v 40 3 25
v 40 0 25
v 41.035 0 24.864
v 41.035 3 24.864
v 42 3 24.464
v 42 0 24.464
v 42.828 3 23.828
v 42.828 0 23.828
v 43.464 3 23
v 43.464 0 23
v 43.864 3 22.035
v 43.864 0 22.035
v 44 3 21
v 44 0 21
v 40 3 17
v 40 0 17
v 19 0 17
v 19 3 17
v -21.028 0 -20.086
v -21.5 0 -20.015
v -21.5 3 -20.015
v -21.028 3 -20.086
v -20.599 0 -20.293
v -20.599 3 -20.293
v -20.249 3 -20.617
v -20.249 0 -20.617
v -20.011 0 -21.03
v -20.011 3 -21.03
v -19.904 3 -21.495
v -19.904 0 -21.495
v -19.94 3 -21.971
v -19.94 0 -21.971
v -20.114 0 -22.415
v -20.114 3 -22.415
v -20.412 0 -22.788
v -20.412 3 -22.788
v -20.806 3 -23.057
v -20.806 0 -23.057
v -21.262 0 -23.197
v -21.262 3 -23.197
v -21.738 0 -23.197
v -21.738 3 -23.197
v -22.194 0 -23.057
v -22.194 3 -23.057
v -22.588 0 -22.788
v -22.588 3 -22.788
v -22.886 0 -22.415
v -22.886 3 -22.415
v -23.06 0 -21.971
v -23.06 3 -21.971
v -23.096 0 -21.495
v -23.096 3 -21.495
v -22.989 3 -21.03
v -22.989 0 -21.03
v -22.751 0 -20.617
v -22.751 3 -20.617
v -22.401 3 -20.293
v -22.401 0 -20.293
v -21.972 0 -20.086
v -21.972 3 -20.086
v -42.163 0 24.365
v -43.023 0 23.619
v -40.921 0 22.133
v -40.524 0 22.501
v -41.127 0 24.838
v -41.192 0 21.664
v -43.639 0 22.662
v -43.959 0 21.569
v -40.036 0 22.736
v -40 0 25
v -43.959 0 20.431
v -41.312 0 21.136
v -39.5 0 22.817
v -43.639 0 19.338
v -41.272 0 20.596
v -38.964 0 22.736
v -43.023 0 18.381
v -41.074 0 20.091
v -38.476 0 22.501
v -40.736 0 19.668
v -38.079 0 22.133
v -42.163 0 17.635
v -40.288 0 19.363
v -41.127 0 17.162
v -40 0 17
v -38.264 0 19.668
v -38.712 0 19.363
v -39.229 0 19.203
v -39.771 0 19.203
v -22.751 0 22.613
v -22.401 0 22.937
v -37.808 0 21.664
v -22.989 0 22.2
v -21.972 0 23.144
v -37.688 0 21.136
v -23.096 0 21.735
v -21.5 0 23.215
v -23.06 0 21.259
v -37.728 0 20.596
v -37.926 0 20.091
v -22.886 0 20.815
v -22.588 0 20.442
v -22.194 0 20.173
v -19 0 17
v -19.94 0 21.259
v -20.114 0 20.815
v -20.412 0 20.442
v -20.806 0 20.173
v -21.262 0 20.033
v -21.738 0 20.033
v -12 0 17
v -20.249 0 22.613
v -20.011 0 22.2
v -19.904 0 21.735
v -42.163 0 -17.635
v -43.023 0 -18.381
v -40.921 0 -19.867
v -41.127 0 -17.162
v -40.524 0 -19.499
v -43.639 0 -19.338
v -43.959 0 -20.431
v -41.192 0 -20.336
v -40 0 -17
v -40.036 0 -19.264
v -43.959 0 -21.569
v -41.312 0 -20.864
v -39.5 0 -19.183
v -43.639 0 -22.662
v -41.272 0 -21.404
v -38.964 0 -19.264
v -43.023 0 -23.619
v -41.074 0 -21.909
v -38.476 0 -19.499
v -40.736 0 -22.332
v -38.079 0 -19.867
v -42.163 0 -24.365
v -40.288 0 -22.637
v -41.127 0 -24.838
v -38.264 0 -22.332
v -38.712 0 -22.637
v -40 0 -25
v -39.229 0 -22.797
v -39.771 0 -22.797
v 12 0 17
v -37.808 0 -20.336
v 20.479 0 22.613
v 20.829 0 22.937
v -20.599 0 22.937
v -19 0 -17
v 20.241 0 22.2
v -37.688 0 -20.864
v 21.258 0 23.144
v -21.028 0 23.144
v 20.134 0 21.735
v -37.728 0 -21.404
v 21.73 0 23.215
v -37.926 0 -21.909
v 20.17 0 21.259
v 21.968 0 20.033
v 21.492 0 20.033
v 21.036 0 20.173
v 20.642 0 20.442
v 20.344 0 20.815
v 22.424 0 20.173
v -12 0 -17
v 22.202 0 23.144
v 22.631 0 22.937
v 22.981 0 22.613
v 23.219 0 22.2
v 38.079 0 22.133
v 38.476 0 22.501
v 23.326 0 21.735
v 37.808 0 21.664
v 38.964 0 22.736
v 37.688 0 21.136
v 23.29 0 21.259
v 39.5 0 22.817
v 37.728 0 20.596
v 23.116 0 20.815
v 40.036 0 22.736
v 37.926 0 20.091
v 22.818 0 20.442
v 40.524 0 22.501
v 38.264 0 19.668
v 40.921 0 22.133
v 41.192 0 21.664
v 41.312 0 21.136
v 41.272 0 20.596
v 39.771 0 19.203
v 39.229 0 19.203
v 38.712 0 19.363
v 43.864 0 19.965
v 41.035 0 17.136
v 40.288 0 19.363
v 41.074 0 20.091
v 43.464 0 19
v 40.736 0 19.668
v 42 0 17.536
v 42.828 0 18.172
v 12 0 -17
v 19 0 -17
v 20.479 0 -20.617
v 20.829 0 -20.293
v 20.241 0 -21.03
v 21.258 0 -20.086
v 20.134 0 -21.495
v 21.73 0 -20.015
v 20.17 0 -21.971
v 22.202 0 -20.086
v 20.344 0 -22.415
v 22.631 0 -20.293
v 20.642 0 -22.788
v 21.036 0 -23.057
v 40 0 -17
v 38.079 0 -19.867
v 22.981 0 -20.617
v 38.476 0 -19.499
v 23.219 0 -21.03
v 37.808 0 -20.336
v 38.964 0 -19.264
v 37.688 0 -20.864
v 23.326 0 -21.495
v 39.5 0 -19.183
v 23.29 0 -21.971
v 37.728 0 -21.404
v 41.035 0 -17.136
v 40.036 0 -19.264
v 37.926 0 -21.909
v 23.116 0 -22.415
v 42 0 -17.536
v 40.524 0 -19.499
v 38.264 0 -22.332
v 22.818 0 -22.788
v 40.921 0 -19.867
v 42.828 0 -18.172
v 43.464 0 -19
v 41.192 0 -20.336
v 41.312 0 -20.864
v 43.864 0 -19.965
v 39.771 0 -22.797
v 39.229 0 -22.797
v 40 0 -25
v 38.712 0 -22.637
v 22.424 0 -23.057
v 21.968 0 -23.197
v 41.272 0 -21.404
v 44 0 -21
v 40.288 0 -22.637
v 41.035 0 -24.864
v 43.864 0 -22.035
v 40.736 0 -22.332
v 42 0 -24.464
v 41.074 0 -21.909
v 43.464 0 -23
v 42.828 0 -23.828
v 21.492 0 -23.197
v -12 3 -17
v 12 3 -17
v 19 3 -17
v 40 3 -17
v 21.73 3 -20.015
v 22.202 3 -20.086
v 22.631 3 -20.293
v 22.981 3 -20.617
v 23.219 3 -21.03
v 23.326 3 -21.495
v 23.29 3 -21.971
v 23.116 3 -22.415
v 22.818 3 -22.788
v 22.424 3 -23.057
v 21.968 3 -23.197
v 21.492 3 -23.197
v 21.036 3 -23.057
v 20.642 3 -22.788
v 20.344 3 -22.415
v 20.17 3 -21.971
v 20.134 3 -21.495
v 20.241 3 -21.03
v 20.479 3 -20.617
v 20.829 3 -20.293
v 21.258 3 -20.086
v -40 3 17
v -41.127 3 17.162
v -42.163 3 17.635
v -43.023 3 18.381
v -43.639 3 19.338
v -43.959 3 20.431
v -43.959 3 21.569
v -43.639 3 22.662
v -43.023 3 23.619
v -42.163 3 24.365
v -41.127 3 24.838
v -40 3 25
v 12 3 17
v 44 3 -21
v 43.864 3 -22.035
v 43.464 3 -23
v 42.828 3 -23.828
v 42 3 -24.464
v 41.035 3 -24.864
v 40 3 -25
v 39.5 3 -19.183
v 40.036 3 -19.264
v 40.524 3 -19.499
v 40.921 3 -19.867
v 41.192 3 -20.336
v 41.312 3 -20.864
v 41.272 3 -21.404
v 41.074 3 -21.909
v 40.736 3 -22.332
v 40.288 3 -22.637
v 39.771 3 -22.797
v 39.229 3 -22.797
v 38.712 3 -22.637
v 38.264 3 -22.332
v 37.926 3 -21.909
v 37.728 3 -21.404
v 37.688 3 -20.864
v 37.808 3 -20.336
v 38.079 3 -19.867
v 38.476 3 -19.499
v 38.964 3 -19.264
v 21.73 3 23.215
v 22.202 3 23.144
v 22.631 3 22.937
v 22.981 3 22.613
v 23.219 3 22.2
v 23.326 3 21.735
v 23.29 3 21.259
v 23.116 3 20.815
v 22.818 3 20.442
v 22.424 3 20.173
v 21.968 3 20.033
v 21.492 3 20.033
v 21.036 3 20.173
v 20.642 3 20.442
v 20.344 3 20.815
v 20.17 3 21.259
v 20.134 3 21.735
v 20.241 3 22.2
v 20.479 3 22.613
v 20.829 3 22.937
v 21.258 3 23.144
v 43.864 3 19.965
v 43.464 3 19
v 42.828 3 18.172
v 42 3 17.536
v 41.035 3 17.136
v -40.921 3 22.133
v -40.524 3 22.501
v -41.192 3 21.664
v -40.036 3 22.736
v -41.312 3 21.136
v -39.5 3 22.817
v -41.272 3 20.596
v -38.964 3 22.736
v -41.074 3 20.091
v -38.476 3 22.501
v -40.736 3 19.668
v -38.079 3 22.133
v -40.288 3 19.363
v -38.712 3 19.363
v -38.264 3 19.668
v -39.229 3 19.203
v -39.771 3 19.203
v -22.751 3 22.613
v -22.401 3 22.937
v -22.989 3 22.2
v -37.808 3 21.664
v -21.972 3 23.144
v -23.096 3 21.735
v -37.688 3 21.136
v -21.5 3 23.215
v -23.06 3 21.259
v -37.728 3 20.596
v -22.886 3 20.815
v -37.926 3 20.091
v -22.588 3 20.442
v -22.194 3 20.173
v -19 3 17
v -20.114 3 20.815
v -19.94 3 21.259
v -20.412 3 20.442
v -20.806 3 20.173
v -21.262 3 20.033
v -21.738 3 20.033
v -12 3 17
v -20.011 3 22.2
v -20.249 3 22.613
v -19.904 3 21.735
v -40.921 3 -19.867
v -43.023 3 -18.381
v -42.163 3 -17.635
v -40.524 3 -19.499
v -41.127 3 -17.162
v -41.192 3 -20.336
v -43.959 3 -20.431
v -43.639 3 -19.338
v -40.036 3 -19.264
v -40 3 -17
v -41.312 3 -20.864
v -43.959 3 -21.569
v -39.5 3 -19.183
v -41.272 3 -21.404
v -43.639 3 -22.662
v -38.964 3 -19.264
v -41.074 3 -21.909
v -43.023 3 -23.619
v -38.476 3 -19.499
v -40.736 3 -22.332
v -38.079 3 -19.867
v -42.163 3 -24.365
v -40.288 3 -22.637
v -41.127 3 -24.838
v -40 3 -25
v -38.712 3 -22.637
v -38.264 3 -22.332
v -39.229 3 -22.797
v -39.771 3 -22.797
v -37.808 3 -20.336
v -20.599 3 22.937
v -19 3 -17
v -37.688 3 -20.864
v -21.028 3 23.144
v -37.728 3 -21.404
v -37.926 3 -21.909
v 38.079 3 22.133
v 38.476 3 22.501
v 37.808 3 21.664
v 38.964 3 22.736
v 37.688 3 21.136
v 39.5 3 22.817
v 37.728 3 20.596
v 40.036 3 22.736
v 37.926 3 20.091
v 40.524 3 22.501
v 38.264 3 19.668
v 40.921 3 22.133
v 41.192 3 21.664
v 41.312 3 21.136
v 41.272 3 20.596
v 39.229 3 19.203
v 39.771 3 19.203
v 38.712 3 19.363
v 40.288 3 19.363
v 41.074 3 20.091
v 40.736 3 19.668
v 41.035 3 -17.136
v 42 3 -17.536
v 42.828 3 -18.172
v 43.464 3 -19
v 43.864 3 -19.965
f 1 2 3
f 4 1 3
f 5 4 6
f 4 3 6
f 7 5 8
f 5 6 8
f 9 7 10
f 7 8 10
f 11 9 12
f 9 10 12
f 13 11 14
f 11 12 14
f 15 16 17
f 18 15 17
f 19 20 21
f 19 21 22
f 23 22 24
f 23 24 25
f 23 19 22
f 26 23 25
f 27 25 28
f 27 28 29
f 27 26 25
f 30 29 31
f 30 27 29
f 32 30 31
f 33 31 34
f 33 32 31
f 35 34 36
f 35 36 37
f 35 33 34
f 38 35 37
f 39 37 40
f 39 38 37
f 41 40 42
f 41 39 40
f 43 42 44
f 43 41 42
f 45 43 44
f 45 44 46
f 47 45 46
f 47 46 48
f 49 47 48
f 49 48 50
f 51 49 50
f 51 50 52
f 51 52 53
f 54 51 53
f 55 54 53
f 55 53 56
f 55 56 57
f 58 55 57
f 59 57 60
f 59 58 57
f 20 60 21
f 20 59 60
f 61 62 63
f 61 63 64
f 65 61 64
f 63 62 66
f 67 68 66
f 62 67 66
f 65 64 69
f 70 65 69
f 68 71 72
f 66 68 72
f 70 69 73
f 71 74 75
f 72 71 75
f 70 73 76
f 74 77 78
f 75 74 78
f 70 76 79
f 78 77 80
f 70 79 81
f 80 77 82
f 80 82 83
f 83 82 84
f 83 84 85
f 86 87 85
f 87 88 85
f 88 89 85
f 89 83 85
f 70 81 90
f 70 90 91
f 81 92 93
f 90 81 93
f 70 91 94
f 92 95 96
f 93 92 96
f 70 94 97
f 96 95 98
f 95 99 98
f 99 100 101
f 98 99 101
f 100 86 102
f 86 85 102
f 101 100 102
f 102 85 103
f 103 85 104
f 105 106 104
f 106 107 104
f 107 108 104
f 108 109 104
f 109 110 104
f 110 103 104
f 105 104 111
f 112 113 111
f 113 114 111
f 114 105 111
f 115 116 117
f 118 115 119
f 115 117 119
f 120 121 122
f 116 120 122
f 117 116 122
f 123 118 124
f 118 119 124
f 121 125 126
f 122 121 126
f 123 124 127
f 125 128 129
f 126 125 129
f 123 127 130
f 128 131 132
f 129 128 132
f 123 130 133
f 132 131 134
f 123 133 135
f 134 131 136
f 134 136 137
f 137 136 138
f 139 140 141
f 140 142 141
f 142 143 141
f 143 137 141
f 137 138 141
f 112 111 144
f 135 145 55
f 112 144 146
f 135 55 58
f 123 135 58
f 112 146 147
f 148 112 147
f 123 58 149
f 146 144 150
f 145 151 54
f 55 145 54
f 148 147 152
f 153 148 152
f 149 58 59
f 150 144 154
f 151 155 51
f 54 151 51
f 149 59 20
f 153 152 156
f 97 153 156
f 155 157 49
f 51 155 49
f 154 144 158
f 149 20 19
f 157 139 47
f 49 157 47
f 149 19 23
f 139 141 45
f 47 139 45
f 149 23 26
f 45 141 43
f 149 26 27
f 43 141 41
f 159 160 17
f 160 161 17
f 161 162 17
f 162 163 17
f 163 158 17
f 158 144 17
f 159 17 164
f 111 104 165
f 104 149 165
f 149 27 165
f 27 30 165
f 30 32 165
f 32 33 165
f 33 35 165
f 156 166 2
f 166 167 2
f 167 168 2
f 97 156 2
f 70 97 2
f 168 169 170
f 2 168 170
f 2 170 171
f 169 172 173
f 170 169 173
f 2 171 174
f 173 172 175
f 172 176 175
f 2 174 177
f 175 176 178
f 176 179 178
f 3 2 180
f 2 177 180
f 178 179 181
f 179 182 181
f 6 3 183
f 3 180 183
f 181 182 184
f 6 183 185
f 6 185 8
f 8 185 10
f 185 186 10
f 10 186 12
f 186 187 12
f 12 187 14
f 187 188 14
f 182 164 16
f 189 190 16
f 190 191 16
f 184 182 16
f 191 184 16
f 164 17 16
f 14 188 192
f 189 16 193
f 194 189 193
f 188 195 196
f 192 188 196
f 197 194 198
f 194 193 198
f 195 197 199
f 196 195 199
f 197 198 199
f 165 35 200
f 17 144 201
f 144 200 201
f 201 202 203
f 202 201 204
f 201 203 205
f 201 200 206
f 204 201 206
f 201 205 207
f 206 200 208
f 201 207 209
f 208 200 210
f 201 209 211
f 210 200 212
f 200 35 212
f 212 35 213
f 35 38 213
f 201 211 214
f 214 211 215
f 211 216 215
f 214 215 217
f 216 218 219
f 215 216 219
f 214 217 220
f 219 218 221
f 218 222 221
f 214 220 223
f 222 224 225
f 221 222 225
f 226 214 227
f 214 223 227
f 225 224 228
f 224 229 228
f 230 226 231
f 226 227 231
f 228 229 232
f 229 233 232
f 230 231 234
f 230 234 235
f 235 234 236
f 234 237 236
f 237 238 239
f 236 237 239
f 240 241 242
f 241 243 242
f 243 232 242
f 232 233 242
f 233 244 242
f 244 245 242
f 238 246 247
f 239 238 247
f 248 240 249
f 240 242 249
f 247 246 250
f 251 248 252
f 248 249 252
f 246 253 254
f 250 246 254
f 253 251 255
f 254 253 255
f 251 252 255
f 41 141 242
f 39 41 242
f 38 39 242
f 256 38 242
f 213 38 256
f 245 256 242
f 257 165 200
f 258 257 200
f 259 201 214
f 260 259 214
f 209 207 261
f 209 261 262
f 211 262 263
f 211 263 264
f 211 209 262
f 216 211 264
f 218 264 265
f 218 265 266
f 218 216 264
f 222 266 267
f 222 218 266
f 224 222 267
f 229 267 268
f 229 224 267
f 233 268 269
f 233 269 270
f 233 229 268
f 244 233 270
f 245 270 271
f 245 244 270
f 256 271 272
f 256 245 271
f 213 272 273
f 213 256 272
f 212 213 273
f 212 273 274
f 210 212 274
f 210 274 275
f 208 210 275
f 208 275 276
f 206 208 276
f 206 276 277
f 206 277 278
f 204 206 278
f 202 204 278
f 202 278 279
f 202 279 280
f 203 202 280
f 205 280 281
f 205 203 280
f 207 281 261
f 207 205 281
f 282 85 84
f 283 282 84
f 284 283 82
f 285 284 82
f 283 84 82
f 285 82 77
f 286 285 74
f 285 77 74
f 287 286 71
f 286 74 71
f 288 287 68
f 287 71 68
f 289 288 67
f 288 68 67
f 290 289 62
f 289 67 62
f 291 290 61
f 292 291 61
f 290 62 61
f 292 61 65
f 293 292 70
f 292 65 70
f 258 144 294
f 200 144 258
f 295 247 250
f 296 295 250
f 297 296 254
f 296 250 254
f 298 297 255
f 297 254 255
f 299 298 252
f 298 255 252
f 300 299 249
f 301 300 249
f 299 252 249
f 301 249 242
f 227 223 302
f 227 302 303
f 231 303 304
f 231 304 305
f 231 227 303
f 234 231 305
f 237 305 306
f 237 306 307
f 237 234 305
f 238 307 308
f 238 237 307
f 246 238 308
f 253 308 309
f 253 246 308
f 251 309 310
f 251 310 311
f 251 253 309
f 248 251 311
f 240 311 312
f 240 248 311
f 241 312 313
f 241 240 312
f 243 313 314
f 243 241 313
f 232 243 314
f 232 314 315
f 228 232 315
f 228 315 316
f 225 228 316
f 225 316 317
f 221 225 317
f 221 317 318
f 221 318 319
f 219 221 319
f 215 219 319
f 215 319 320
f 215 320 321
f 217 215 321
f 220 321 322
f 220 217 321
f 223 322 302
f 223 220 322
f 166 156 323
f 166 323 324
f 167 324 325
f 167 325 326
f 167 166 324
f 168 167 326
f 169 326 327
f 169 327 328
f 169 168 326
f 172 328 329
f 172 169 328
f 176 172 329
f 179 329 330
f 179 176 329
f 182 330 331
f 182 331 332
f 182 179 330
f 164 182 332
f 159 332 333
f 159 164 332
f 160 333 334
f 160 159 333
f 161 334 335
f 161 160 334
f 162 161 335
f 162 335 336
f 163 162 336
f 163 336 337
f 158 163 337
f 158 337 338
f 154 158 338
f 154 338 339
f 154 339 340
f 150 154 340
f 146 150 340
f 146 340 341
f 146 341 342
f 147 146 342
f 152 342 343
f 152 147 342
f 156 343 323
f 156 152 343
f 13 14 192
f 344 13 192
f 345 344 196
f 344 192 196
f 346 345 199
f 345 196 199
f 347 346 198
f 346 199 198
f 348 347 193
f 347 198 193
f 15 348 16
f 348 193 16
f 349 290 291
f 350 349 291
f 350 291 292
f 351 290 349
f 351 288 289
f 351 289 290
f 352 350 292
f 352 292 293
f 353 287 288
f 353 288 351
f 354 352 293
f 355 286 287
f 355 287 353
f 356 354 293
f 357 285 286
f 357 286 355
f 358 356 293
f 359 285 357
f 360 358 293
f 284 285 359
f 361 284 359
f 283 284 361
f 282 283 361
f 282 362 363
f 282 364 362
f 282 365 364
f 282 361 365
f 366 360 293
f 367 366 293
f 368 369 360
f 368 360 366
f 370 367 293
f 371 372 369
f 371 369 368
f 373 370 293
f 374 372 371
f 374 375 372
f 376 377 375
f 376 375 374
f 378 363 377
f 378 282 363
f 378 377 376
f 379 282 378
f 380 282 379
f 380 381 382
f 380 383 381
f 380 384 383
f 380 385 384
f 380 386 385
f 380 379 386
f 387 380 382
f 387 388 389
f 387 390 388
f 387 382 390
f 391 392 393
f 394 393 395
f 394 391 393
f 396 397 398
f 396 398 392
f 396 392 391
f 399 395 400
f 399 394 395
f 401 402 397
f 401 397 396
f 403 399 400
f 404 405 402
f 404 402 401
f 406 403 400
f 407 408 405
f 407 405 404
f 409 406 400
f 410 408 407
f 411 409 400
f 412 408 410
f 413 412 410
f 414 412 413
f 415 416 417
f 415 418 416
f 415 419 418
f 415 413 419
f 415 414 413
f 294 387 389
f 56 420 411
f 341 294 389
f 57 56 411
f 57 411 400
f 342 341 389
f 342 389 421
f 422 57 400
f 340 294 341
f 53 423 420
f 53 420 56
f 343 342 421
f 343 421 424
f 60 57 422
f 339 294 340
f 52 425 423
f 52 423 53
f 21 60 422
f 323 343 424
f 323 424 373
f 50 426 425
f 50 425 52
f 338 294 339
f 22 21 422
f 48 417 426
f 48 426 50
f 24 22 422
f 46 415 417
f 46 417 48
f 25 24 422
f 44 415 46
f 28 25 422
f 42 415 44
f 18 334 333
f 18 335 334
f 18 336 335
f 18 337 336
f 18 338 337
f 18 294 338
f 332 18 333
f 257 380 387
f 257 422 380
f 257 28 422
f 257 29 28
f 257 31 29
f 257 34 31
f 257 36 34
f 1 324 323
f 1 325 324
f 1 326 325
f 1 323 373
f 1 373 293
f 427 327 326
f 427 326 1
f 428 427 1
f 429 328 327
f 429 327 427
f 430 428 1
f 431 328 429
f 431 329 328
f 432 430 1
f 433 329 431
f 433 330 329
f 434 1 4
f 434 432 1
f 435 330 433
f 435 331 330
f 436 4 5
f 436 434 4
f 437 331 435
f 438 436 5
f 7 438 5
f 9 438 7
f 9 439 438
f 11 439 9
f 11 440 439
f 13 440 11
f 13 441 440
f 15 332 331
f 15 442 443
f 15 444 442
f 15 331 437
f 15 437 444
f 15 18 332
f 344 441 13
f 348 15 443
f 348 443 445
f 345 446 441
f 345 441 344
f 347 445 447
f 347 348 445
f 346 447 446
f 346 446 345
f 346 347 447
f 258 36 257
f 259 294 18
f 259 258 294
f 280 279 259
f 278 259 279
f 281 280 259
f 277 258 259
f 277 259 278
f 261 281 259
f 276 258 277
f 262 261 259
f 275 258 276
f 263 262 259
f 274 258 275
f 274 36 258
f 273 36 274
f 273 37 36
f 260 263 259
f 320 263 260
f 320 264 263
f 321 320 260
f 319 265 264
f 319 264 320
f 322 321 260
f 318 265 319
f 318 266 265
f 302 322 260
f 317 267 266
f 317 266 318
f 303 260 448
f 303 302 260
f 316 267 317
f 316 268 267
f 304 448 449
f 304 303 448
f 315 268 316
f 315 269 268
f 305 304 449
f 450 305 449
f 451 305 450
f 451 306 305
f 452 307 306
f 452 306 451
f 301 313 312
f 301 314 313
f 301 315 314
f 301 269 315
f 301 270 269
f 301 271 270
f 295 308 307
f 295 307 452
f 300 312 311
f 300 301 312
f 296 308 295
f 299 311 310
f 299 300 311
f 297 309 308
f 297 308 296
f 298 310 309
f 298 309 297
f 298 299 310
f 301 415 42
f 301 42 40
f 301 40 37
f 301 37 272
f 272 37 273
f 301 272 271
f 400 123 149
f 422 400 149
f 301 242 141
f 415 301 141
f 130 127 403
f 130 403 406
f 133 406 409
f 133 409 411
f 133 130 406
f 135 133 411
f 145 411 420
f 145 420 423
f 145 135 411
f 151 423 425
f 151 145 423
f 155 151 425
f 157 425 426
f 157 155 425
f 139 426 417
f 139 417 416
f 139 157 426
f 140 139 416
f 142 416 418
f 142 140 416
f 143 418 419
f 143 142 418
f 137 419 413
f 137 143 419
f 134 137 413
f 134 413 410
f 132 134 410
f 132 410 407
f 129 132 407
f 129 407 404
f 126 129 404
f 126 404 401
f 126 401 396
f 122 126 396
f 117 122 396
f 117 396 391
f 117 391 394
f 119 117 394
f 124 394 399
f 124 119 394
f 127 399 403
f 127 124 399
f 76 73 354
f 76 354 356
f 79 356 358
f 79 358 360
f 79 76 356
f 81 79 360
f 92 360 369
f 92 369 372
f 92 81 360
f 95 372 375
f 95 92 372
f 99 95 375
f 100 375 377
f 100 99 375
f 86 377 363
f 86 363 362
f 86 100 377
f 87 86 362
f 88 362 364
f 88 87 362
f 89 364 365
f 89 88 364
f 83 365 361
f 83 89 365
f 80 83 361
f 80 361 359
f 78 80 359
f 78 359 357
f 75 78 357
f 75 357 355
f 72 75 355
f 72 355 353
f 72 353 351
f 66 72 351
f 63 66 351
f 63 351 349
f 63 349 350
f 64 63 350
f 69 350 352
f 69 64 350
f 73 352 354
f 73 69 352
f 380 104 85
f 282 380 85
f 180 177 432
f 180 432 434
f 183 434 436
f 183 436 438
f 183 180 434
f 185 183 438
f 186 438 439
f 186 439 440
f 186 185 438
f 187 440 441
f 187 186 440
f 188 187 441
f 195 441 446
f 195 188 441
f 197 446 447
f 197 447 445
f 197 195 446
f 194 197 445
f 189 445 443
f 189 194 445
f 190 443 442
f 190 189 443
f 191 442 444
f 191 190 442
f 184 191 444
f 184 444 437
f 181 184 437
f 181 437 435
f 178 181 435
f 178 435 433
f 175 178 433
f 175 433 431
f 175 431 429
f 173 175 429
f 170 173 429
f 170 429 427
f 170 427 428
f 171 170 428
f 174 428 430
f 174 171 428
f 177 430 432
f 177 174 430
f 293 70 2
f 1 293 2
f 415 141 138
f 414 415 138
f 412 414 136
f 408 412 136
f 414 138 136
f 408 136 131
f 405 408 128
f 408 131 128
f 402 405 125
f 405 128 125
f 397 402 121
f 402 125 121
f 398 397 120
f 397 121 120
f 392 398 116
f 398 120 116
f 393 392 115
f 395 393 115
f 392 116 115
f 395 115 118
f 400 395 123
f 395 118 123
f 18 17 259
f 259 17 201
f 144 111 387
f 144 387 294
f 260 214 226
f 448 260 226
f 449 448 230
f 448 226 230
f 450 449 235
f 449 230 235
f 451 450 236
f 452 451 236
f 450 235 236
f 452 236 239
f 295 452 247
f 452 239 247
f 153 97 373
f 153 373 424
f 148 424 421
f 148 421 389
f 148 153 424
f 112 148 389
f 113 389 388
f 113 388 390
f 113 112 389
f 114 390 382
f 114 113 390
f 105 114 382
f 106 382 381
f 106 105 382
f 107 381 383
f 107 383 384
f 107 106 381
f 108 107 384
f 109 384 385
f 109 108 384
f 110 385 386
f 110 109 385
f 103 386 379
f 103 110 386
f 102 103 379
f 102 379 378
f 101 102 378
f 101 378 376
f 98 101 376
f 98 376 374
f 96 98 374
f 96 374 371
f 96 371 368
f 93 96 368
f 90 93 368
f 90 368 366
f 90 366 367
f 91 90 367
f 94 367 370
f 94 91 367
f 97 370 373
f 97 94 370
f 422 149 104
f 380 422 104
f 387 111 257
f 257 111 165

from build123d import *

# Parameters (mm, degrees)
SKETCH_1_R      = 1.6
SKETCH_1_R_2    = 1.817226884
SKETCH_1_W      = 24
SKETCH_1_H      = 34
EXTRUDE_1_DEPTH = 3


with BuildPart() as part:
    # 草图1 → 凸台-拉伸1 (new body)
    # profile 1 of 3: a face of its own
    with BuildSketch(Plane(origin=(0, 0, 0), x_dir=(1, 0, 0), z_dir=(0, 1, 0))):
        with BuildLine():
            Line((19, -17), (19, 17))
            Line((19, 17), (40, 17))
            ThreePointArc((40, 17), (42.828427126, 18.171572876), (44, 21.000000002))
            ThreePointArc((44, 21.000000002), (42.828427124, 23.828427126), (40, 25))
            Line((40, 25), (19, 25))
            Line((19, 25), (-19, 25))
            Line((-19, 25), (-19, 17))
            Line((-19, 17), (-19, -17))
            Line((-19, -17), (-19, -25))
            Line((-19, -25), (19, -25))
            Line((19, -25), (40, -25))
            ThreePointArc((40, -25), (42.828427125, -23.828427125), (44, -21))
            ThreePointArc((44, -21), (42.828427125, -18.171572875), (40, -17))
            Line((40, -17), (19, -17))
        make_face()
        with Locations(Location((21.73, -21.615, 0), (0, 0, 270))):
            Circle(SKETCH_1_R, mode=Mode.SUBTRACT)
        with Locations(Location((39.5, -21, 0), (0, 0, 270))):
            Circle(SKETCH_1_R_2, mode=Mode.SUBTRACT)
        Rectangle(SKETCH_1_W, SKETCH_1_H, mode=Mode.SUBTRACT)
        with Locations(Location((21.73, 21.615, 0), (0, 0, 270))):
            Circle(SKETCH_1_R, mode=Mode.SUBTRACT)
        with Locations(Location((39.5, 21, 0), (0, 0, 270))):
            Circle(SKETCH_1_R_2, mode=Mode.SUBTRACT)
    # profile 2 of 3: a face of its own
    with BuildSketch(Plane(origin=(0, 0, 0), x_dir=(1, 0, 0), z_dir=(0, 1, 0))):
        with BuildLine():
            Line((-19, 17), (-19, 25))
            Line((-19, 25), (-40, 25))
            ThreePointArc((-40, 25), (-44, 21), (-40, 17))
            Line((-40, 17), (-19, 17))
        make_face()
        with Locations(Location((-39.5, 21, 0), (0, 0, 270))):
            Circle(SKETCH_1_R_2, mode=Mode.SUBTRACT)
        with Locations(Location((-21.5, 21.615, 0), (0, 0, 270))):
            Circle(SKETCH_1_R, mode=Mode.SUBTRACT)
    # profile 3 of 3: a face of its own
    with BuildSketch(Plane(origin=(0, 0, 0), x_dir=(1, 0, 0), z_dir=(0, 1, 0))):
        with BuildLine():
            Line((-40, -25), (-19, -25))
            Line((-19, -25), (-19, -17))
            Line((-19, -17), (-40, -17))
            ThreePointArc((-40, -17), (-44, -21), (-40, -25))
        make_face()
        with Locations(Location((-39.5, -21, 0), (0, 0, 270))):
            Circle(SKETCH_1_R_2, mode=Mode.SUBTRACT)
        with Locations(Location((-21.5, -21.615, 0), (0, 0, 270))):
            Circle(SKETCH_1_R, mode=Mode.SUBTRACT)
    extrude(amount=EXTRUDE_1_DEPTH)


solid = part.part
